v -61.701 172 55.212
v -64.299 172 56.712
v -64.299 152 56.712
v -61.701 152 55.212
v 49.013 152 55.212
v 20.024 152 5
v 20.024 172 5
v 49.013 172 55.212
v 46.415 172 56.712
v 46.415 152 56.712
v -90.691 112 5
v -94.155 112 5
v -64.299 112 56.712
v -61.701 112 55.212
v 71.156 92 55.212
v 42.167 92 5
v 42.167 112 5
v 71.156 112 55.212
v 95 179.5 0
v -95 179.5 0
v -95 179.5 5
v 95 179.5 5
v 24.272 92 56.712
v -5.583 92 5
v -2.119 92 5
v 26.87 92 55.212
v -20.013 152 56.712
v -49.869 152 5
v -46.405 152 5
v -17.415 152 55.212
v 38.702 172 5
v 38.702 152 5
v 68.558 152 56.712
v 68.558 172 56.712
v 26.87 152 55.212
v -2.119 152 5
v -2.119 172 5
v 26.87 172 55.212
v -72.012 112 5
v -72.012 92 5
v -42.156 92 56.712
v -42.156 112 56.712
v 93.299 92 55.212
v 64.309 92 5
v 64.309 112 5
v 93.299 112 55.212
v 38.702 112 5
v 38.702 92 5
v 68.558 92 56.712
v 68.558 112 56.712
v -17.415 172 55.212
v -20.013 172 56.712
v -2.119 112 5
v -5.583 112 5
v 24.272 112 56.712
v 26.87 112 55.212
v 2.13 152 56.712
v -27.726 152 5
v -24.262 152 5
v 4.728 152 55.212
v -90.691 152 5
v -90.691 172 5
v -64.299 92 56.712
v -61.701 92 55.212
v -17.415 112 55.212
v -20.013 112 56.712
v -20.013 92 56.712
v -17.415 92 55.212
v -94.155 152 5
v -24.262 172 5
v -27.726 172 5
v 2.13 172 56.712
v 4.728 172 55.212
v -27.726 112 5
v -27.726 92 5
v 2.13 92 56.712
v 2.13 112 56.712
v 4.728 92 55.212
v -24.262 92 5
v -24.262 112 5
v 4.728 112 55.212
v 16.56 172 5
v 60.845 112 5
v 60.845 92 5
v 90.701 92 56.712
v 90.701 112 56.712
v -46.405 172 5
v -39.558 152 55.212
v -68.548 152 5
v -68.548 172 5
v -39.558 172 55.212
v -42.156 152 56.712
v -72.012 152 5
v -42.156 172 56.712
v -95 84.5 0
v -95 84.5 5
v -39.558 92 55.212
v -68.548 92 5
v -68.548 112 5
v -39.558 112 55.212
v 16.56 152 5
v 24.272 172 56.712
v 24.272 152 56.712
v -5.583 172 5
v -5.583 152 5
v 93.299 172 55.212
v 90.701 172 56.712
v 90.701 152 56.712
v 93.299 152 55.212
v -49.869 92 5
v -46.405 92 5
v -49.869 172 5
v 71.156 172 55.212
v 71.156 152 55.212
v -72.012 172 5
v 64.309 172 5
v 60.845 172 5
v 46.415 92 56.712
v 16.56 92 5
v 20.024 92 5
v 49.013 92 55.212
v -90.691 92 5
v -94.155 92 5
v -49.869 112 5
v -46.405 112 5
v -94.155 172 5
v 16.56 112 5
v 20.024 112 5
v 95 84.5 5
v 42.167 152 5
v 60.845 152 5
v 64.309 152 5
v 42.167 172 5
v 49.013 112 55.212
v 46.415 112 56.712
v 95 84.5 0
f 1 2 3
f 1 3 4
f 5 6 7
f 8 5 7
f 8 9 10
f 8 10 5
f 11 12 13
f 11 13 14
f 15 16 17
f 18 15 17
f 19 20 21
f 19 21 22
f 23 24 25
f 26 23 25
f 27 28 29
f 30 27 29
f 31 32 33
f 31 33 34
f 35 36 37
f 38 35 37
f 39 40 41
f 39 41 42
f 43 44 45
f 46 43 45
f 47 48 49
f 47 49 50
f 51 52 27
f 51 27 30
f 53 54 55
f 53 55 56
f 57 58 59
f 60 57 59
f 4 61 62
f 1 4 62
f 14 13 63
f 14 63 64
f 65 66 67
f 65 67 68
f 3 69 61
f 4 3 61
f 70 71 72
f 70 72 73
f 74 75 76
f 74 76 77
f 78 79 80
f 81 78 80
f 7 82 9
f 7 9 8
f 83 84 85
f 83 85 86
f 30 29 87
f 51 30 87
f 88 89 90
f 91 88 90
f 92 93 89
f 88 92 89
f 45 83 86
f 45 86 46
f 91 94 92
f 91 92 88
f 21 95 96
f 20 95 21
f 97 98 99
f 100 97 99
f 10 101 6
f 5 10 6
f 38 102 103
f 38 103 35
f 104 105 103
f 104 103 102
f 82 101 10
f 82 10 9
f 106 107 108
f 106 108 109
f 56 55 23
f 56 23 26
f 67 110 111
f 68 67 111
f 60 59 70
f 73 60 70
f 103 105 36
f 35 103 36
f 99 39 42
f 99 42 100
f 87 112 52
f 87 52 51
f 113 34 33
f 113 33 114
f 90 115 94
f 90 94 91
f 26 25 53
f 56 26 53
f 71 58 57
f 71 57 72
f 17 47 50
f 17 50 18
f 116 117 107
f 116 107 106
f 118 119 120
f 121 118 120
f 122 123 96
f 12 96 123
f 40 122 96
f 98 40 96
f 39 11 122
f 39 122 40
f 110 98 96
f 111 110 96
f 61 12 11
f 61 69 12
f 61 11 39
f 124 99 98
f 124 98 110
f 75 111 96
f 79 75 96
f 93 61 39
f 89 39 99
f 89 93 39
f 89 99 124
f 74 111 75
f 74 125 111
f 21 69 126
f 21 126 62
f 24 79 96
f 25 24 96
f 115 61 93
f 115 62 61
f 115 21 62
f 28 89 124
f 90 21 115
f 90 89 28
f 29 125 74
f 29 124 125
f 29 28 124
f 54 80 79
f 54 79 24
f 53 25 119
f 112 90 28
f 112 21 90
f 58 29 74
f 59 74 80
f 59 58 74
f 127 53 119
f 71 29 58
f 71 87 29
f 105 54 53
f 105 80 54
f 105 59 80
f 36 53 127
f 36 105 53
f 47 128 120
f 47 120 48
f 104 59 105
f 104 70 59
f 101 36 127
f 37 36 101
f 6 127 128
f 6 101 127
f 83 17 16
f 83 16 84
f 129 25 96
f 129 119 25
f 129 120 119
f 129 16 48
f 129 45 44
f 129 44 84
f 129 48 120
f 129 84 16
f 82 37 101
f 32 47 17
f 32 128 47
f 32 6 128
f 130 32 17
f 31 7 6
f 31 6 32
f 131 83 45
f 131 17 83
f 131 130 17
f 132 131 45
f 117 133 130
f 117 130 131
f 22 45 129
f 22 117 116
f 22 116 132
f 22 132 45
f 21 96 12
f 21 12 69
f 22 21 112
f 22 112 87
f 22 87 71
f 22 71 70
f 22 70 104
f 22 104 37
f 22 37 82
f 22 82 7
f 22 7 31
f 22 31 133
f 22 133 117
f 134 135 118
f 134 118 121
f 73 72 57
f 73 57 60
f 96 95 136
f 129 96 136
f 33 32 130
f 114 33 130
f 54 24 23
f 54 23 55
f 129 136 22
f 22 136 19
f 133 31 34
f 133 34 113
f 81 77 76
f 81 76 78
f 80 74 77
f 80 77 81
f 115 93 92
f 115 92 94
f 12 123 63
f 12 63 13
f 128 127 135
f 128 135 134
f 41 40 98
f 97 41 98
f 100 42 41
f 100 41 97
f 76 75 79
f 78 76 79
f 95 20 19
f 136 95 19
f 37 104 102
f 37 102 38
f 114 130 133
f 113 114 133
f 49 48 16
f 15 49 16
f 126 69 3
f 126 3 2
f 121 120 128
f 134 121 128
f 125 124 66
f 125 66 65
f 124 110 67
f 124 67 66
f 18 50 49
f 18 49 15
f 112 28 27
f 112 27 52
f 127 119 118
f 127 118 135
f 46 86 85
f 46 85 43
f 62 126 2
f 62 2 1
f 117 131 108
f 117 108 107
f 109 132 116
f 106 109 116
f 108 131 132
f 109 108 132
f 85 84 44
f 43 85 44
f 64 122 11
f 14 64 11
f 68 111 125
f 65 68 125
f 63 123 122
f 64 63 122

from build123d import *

# Parameters (mm, degrees)
SKETCH022_W            = 190
SKETCH022_H            = 95
PAD014_DEPTH           = 5
SKETCH023_W            = 3
SKETCH023_H            = 20
PAD015_DEPTH           = 60
LINEARPATTERN009_COUNT = 8
LINEARPATTERN009_PITCH = 22.142857


with BuildPart() as part:
    # Sketch022 → Pad014 (new body)
    with BuildSketch(Plane.XY):
        Rectangle(SKETCH022_W, SKETCH022_H)
    extrude(amount=PAD014_DEPTH)

    # Sketch023 (on DatumPlane) → Pad015 (join)
    with BuildSketch(Plane(origin=(62, 0, 4), x_dir=(0.866025, 0, -0.5), z_dir=(0.5, 0, 0.866025))):
        with Locations((0, 30)):
            Rectangle(SKETCH023_W, SKETCH023_H)
        with Locations((0, -30)):
            Rectangle(SKETCH023_W, SKETCH023_H)
    pad015 = extrude(amount=PAD015_DEPTH)

    # LinearPattern009: Pad015 ×8
    with Locations(*[(-i * LINEARPATTERN009_PITCH, 0, 0) for i in range(1, LINEARPATTERN009_COUNT)]):
        add(pad015)


with BuildPart() as part_1:
    # Body007 placement: moved
    add(part.part.moved(Location((0, 132, 0))))


solid = part_1.part
